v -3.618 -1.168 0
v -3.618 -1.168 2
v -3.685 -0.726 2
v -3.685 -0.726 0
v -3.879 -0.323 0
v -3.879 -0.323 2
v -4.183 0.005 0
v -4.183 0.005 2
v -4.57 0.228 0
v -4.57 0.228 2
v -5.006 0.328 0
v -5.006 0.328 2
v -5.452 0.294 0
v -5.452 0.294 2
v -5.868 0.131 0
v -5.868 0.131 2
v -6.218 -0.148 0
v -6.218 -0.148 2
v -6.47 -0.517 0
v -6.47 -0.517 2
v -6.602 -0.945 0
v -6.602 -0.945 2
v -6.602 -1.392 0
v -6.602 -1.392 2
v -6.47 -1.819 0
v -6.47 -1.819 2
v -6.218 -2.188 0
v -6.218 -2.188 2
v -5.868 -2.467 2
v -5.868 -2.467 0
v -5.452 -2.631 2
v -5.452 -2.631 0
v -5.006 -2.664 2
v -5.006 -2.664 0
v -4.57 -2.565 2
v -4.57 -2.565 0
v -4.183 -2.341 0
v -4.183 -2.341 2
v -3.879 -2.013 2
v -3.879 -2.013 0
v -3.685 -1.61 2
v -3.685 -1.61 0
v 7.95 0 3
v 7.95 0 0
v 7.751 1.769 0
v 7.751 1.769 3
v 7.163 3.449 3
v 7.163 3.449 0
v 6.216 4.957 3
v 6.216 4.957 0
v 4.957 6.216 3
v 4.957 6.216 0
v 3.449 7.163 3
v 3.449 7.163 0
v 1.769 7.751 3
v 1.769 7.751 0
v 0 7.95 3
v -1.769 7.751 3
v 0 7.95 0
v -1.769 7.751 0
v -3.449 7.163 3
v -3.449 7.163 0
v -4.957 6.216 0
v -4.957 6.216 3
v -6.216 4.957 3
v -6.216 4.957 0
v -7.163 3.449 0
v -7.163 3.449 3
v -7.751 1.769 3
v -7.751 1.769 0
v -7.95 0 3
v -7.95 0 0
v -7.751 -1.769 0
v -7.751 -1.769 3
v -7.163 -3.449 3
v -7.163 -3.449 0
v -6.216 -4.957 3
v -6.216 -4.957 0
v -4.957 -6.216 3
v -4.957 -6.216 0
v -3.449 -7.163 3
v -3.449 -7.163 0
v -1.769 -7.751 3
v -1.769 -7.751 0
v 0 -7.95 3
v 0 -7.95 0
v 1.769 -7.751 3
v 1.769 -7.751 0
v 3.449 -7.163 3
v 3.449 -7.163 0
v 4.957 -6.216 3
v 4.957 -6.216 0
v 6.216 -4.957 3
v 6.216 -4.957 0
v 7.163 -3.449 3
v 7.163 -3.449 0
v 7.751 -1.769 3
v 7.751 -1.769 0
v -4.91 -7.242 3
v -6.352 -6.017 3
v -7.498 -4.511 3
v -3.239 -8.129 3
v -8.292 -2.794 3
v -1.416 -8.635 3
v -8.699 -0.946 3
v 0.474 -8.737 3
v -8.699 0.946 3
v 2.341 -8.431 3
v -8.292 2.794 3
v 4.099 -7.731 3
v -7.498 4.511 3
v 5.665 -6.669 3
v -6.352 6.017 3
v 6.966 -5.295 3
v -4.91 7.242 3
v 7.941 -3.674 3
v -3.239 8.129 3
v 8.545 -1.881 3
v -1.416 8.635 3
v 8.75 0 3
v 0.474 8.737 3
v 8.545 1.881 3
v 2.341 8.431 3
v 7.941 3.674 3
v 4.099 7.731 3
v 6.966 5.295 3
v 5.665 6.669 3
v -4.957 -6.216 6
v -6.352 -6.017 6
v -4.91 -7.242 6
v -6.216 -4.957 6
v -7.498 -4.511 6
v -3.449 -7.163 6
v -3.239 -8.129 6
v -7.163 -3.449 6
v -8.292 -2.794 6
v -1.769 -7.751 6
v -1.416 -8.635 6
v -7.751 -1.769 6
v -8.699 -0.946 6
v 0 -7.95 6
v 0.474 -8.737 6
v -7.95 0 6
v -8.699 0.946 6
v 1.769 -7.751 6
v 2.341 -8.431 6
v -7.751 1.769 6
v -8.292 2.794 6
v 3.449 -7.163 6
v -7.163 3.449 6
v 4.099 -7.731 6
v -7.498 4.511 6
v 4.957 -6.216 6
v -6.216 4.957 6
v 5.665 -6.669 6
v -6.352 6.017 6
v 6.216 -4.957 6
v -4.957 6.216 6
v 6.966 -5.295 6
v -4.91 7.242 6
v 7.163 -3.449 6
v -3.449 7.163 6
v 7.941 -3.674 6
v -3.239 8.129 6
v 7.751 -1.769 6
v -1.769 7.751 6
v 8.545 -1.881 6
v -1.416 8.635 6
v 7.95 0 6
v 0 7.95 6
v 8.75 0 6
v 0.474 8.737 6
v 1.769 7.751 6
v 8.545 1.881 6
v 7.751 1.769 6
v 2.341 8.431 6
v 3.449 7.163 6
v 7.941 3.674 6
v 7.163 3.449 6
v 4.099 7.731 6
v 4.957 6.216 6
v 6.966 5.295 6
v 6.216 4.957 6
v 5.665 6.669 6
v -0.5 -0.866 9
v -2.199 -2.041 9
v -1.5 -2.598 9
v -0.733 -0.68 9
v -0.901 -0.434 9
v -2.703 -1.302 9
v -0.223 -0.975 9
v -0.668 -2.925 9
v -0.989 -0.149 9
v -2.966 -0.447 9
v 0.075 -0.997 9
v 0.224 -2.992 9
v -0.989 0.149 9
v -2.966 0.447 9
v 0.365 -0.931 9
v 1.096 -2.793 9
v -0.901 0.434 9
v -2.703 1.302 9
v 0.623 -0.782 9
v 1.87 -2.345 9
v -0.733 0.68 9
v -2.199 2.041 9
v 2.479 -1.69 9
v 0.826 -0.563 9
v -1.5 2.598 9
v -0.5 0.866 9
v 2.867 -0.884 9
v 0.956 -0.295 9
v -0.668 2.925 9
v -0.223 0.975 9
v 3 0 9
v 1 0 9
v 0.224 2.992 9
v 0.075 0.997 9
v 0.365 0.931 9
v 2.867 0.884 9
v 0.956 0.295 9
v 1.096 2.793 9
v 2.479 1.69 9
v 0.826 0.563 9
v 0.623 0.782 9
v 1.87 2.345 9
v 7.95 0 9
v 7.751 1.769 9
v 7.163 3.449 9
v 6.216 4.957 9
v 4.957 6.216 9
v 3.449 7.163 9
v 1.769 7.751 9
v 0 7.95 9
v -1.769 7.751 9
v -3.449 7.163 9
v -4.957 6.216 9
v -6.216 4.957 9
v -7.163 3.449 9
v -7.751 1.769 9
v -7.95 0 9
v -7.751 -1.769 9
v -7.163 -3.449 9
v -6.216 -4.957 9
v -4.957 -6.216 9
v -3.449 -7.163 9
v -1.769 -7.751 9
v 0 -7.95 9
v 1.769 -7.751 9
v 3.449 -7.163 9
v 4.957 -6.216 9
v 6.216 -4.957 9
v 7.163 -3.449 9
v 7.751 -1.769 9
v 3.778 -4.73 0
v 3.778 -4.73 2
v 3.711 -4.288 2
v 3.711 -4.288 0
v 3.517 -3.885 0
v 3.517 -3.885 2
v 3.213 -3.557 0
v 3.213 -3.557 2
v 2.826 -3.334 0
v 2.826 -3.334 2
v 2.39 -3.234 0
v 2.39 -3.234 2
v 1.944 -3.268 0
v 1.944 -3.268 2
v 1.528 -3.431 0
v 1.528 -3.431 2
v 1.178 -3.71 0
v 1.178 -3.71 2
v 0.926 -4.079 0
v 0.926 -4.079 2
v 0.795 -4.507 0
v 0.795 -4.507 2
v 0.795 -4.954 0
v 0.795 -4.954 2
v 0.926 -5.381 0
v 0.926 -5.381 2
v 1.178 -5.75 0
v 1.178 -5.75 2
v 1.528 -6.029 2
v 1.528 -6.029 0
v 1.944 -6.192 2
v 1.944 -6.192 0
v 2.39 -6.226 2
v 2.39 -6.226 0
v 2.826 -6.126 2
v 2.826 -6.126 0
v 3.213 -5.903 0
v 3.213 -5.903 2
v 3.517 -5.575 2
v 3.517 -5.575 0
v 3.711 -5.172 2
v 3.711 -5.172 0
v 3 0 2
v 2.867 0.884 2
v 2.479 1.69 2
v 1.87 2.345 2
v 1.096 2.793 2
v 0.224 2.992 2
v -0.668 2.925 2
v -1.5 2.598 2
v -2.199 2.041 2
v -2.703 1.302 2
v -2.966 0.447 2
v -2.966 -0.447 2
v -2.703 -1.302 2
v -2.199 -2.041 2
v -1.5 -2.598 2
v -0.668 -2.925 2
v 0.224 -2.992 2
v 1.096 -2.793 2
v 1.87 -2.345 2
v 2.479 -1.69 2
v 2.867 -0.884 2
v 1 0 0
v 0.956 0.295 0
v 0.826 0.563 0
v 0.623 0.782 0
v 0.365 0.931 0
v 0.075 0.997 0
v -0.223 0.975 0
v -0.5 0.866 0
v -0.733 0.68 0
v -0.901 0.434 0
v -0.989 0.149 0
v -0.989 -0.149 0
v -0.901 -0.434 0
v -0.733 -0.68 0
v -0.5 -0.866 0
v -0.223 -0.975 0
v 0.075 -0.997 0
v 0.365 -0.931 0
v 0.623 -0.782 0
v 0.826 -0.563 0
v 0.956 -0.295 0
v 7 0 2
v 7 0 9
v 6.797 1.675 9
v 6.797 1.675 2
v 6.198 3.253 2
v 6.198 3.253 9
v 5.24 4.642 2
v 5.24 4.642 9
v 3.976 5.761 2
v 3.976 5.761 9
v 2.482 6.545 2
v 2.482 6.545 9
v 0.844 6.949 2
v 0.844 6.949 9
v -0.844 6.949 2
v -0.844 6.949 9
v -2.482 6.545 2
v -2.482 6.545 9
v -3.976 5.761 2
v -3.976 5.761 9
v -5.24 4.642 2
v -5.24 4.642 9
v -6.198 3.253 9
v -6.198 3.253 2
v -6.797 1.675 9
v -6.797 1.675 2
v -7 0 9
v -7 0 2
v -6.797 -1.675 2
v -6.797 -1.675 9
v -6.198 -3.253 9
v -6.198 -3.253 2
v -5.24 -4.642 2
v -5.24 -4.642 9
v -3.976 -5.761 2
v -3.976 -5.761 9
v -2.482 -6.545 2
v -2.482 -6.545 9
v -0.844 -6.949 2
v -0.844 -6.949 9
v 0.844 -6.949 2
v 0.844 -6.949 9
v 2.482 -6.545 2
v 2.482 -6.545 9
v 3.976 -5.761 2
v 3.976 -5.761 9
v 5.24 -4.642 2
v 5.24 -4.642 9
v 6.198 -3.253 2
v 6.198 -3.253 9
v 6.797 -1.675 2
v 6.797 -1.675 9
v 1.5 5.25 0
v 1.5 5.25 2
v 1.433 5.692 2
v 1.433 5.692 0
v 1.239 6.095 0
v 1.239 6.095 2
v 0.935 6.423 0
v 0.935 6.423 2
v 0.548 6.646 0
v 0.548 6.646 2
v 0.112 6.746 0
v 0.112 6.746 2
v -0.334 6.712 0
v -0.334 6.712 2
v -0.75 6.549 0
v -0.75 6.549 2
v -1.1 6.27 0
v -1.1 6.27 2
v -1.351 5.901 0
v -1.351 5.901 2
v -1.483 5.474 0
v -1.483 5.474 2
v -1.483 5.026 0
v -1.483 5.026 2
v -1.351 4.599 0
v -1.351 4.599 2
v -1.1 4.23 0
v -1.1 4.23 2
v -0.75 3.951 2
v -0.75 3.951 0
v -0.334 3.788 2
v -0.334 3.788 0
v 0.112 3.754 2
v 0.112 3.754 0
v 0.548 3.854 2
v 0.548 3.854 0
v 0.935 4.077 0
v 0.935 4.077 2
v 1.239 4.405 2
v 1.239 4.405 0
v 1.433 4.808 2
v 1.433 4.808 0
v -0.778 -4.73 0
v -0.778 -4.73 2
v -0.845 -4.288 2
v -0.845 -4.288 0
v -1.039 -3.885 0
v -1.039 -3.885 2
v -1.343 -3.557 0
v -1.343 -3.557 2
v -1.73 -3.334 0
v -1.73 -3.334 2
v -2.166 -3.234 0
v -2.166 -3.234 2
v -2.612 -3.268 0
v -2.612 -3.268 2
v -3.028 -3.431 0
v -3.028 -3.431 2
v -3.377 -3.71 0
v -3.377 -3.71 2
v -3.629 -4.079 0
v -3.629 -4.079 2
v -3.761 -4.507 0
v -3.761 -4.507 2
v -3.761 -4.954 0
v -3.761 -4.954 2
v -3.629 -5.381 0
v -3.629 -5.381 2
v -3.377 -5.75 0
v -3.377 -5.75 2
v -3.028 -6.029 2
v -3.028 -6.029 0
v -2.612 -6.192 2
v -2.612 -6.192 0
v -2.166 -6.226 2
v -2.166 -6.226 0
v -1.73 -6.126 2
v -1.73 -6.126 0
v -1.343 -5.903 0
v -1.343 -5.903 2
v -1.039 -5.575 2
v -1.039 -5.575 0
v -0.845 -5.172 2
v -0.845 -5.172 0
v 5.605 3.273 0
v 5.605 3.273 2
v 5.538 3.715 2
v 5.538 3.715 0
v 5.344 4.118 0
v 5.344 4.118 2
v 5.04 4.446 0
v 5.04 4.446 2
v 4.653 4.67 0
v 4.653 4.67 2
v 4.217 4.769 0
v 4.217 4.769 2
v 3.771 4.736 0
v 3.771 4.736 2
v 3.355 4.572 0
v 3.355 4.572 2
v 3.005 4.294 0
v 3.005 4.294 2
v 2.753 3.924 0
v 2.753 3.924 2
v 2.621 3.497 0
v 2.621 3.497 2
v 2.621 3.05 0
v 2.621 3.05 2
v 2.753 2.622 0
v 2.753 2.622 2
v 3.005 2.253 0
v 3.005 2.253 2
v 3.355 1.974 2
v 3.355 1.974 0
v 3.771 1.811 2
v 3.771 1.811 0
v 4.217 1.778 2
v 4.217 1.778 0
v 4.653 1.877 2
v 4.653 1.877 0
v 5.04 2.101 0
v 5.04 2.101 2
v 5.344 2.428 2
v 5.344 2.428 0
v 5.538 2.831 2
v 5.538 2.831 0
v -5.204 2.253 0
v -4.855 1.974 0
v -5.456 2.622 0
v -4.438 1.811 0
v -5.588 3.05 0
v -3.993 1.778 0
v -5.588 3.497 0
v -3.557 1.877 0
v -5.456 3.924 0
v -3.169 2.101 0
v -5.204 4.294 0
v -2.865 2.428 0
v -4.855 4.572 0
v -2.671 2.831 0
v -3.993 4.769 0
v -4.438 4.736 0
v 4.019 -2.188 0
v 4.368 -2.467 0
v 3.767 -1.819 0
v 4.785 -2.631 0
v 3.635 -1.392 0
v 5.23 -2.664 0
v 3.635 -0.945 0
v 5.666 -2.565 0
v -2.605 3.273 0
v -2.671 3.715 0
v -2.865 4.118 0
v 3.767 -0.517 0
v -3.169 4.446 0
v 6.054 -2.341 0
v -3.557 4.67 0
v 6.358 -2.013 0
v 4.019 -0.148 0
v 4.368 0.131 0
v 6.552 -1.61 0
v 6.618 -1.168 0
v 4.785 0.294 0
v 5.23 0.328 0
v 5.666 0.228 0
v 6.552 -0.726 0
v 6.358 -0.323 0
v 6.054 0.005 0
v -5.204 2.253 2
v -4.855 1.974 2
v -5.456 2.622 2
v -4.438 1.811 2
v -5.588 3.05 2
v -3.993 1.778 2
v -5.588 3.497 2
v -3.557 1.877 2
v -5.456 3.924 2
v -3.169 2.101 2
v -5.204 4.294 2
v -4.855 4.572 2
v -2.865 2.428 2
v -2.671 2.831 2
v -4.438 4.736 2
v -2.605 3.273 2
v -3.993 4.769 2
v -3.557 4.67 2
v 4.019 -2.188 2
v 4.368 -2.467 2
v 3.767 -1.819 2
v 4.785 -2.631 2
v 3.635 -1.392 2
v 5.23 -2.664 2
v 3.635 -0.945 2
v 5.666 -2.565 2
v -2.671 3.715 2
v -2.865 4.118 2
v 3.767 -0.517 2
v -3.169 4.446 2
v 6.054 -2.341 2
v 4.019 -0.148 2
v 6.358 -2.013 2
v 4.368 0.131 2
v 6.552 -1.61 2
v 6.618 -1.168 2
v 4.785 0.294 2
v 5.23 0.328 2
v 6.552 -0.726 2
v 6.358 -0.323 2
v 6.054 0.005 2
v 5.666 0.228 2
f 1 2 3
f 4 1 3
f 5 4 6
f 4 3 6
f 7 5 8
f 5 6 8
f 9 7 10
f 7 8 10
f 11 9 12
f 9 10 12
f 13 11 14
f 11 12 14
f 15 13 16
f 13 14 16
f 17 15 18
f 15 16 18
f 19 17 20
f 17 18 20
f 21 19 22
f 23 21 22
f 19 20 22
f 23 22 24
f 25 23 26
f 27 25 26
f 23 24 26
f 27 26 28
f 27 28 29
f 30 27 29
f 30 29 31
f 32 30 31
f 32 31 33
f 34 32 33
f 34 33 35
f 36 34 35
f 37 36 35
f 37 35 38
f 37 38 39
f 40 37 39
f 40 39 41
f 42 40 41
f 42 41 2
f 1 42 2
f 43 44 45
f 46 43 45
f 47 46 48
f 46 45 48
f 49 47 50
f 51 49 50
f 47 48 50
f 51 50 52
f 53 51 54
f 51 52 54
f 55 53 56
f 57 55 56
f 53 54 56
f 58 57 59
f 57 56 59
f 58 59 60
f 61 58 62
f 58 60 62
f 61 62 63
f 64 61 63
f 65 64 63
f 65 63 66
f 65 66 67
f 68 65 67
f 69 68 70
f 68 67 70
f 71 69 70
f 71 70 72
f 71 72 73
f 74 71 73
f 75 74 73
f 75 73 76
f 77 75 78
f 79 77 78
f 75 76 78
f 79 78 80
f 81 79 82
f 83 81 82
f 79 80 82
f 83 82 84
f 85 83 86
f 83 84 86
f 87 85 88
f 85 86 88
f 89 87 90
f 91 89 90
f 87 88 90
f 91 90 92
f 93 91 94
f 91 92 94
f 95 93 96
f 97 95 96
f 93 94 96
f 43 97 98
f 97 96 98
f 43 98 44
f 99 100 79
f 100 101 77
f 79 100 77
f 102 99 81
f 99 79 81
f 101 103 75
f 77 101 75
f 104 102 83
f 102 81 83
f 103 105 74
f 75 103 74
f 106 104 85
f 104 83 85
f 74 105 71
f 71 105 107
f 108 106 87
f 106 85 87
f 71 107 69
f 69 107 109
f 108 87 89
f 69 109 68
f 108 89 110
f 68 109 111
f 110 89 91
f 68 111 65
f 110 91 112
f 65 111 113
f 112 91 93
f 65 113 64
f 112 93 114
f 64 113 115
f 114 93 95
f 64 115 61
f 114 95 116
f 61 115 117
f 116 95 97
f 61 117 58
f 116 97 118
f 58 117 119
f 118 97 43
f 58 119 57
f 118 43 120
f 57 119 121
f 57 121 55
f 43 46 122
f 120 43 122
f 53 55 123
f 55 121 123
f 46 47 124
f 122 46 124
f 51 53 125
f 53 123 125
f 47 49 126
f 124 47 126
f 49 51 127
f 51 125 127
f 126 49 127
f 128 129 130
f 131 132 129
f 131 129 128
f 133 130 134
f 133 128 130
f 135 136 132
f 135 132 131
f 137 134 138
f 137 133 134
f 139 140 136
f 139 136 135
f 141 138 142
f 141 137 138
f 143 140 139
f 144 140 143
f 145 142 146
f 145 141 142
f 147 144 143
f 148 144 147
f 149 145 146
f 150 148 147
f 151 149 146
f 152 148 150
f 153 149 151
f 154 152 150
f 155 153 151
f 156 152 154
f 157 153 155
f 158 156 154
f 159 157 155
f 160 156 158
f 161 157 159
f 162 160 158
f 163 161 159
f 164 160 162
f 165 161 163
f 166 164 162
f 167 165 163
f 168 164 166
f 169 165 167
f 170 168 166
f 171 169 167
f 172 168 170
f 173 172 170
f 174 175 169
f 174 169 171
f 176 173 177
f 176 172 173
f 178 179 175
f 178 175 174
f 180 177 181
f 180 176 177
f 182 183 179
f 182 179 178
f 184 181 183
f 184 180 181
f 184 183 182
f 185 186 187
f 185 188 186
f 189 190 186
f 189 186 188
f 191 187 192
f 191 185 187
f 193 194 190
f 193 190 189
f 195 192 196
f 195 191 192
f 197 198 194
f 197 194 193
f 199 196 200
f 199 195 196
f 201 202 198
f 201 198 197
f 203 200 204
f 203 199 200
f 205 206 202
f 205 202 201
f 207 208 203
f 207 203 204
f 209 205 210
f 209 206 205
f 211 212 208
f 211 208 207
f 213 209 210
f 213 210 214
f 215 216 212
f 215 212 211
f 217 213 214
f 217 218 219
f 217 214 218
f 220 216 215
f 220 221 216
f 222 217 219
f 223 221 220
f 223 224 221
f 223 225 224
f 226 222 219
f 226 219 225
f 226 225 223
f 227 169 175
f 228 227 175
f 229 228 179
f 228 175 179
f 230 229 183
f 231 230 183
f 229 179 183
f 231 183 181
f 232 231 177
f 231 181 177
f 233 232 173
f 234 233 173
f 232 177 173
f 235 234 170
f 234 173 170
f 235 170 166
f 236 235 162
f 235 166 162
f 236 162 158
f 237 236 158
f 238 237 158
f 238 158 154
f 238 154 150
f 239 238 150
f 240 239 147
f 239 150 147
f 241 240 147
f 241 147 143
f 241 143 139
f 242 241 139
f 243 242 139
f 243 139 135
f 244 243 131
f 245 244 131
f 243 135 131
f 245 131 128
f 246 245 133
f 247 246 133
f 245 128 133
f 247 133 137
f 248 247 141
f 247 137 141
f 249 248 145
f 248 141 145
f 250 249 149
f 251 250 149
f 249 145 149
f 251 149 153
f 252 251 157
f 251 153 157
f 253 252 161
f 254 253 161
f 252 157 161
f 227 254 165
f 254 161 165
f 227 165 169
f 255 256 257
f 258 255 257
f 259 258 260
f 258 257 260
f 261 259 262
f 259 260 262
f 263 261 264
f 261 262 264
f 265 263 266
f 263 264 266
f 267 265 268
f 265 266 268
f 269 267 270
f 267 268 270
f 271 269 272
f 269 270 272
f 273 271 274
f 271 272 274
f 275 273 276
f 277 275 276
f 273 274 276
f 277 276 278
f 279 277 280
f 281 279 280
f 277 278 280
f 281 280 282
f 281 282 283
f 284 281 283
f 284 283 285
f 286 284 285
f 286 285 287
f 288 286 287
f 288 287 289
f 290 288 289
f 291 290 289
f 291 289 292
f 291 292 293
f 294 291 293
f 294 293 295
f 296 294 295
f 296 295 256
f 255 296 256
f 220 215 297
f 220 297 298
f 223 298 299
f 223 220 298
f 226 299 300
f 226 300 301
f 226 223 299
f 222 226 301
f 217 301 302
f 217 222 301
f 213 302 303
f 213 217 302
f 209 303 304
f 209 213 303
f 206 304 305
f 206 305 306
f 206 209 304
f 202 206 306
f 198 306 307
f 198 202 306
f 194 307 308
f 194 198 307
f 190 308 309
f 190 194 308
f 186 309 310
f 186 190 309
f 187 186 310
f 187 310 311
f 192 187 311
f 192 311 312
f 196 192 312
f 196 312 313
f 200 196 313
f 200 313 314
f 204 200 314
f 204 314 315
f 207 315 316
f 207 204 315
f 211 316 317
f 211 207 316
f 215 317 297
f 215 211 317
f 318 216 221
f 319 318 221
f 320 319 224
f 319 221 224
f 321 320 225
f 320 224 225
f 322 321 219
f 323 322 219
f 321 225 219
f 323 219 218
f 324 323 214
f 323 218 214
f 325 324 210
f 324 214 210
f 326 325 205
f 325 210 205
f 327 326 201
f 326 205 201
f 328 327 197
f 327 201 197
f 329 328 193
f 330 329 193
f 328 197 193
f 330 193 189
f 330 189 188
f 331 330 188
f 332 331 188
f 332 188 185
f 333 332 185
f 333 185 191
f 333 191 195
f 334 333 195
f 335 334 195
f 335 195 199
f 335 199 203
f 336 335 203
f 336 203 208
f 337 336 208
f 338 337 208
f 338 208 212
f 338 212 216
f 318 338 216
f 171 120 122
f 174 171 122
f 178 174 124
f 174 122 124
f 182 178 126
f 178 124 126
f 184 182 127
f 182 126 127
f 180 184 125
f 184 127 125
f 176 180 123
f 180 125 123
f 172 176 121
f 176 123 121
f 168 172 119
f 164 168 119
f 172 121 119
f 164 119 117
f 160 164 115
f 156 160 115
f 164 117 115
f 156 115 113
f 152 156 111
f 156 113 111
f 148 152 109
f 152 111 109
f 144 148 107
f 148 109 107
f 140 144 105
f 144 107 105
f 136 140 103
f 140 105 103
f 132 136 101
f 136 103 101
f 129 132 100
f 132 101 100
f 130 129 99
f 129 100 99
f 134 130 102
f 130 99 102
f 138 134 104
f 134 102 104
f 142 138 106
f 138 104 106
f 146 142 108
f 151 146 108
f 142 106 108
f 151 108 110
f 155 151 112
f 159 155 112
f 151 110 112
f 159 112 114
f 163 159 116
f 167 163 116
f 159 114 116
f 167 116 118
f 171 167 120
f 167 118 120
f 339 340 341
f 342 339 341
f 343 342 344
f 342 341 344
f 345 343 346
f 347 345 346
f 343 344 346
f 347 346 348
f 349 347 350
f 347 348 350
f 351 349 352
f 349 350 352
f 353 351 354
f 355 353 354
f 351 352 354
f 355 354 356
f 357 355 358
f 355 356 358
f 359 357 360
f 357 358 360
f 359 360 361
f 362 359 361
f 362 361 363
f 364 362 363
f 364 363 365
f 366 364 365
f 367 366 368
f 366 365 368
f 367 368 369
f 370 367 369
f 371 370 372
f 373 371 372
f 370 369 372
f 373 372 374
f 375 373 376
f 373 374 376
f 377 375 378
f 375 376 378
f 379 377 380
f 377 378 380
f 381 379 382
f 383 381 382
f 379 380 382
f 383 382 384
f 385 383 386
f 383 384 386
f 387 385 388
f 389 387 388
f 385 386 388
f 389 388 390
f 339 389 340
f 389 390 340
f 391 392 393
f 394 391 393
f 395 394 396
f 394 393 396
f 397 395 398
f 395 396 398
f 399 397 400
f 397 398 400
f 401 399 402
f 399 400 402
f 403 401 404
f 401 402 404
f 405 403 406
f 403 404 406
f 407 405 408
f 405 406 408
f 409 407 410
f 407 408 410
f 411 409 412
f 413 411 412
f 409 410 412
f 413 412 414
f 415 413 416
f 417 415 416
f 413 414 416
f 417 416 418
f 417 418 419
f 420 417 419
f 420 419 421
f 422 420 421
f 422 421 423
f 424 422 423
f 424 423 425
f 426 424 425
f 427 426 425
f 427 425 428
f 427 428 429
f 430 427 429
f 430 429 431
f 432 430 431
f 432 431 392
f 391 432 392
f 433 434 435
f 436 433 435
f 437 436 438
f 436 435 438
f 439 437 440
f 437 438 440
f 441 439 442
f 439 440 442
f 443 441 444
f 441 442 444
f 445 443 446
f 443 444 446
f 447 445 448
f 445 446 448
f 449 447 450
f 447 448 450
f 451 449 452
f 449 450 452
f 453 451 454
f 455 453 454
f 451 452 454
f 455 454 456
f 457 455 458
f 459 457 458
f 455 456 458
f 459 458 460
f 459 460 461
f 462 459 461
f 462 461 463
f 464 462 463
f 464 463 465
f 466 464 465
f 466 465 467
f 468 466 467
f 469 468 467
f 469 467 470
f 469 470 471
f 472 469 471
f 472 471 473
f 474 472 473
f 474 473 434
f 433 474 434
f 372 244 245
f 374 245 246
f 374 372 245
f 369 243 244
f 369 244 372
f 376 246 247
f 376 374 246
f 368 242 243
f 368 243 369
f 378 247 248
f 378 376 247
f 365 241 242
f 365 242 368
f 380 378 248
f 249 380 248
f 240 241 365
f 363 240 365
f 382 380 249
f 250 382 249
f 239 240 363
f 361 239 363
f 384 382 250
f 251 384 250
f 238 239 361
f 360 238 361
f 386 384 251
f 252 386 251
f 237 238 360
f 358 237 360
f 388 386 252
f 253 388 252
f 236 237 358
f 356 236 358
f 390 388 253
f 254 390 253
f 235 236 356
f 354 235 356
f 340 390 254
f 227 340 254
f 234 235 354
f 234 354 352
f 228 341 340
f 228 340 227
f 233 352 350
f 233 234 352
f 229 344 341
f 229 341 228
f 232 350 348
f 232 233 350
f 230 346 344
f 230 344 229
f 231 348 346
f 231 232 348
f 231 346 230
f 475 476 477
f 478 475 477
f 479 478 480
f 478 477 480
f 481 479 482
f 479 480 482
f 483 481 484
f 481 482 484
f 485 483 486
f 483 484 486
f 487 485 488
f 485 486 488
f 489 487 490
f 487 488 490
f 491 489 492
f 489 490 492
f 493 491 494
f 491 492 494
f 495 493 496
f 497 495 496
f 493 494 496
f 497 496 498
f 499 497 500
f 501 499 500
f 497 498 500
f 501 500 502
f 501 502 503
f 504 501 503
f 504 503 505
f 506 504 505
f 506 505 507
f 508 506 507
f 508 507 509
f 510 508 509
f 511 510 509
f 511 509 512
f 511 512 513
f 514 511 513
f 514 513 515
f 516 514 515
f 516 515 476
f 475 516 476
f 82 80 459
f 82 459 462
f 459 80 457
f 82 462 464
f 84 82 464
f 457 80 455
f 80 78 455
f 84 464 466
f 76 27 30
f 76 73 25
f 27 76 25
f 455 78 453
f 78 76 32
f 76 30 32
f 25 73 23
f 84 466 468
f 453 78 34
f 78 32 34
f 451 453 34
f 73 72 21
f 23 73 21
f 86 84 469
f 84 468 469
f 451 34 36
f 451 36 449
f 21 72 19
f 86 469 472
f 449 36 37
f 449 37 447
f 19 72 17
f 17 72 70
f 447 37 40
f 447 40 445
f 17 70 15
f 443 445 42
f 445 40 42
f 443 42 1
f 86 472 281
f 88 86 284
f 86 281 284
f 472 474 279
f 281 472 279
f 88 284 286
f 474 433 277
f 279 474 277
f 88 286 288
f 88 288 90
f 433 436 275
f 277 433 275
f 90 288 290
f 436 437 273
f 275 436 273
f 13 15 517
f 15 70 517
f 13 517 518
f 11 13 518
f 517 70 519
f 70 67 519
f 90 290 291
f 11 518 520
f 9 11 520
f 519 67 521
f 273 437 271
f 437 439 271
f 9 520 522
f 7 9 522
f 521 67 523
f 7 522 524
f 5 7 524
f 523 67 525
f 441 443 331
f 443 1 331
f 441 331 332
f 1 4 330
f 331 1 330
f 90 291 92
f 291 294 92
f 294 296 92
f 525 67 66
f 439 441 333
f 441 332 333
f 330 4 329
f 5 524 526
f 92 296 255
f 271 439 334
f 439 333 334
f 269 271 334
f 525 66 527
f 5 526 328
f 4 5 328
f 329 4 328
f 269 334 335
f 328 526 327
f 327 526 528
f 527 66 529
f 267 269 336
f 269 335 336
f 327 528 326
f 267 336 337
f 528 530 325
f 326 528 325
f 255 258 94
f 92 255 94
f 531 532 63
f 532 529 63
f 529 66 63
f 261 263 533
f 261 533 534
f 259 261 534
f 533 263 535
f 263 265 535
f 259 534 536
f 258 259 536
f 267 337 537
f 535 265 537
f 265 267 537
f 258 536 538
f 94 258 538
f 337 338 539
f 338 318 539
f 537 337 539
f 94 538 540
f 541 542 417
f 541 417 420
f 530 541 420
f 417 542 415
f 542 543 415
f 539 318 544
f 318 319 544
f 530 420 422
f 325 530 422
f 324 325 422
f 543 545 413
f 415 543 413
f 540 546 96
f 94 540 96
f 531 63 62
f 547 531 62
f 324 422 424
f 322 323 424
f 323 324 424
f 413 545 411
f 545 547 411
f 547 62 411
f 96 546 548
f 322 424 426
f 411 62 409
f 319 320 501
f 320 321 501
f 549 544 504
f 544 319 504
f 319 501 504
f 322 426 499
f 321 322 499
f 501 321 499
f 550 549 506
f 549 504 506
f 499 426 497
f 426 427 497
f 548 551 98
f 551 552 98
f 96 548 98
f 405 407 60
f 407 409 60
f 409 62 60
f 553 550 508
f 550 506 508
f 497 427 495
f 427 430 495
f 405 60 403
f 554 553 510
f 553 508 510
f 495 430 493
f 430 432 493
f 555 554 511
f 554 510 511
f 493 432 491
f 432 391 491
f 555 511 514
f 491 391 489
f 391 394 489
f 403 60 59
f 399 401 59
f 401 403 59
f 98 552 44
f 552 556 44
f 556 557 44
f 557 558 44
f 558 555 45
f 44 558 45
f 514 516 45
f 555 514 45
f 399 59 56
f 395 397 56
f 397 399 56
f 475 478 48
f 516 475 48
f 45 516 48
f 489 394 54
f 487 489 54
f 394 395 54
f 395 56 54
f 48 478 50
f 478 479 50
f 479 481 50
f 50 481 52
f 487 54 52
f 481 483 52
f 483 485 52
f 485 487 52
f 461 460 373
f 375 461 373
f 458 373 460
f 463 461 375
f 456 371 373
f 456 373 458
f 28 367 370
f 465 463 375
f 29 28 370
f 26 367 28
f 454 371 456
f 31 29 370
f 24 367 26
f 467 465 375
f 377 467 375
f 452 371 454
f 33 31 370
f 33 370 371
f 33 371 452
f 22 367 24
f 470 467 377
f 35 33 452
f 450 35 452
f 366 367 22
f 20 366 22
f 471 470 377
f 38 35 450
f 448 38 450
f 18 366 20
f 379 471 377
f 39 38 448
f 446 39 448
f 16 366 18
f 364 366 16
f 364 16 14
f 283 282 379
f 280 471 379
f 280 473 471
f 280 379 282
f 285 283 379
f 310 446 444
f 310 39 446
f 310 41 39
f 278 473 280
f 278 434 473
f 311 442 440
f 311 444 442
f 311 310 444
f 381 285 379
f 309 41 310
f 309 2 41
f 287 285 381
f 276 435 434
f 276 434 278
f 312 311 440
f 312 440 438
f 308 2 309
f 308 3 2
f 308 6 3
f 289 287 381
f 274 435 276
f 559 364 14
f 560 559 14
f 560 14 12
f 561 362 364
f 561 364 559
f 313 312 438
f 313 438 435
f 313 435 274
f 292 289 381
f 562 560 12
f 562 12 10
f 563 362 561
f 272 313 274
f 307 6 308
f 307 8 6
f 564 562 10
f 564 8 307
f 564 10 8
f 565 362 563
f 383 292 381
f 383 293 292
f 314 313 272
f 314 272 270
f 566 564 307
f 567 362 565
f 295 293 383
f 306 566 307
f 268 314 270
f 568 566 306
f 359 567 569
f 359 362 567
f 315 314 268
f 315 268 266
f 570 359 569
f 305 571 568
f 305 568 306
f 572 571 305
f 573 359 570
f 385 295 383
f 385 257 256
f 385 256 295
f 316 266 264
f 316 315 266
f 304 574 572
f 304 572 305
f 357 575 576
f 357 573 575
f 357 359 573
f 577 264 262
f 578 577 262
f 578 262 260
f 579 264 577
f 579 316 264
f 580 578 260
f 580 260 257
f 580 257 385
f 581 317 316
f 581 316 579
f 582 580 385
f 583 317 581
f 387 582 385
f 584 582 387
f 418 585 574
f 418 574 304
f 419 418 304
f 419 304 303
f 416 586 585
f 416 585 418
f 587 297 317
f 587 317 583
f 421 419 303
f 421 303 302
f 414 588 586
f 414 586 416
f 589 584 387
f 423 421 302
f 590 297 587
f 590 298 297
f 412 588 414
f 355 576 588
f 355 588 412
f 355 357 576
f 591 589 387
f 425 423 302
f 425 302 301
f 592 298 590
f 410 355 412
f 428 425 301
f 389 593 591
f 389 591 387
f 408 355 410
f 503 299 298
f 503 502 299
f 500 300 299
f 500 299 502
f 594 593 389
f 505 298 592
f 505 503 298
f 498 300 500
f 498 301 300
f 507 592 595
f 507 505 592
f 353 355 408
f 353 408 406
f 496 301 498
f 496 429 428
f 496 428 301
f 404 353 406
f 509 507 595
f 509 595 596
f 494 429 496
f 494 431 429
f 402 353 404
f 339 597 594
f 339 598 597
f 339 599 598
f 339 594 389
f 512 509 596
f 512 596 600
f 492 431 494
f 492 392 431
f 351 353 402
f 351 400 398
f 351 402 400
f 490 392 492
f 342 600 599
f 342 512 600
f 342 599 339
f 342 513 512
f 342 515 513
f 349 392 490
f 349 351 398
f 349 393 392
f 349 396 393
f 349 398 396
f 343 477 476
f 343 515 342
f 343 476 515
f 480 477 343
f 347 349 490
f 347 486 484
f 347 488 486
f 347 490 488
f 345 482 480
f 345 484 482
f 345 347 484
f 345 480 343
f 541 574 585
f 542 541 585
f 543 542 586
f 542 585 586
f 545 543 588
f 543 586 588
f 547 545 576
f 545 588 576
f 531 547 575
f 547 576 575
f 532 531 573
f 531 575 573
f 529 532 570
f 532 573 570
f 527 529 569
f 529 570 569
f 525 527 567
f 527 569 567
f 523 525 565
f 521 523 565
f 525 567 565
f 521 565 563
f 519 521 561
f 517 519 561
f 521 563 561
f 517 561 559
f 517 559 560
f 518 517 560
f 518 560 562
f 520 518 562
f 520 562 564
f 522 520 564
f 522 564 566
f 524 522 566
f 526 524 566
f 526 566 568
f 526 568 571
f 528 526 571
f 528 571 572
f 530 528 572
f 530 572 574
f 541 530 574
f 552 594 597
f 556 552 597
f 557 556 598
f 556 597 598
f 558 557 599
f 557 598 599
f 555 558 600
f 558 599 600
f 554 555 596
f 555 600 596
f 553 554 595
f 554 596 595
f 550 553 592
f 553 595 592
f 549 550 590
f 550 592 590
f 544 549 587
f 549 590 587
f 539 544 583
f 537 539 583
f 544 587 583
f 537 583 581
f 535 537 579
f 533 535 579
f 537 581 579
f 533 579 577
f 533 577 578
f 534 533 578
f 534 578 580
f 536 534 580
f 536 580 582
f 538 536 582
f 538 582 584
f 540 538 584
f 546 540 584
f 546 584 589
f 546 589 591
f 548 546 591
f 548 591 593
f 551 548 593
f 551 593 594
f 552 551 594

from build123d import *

# Parameters (mm, degrees)
F0_R      = 7.95
F1_DEPTH  = 3
F2_R      = 8.75
F2_R_2    = 7.95
F3_DEPTH  = 3
F4_R      = 7.95
F5_DEPTH  = 3
F6_R      = 1.5
F7_DEPTH  = 25
F8_R      = 7
F8_R_2    = 1.5
F8_R_3    = 3
F9_DEPTH  = 7
F10_R     = 1
F11_DEPTH = 25


with BuildPart() as f1:
    # F0 (on Top) → F1 (new body)
    with BuildSketch(Plane.XY):
        Circle(F0_R)
    extrude(amount=F1_DEPTH)

    # F2 (on face) → F3 (join)
    with BuildSketch(Plane.XY.offset(3)):
        Circle(F2_R)
        Circle(F2_R_2, mode=Mode.SUBTRACT)
        Circle(F2_R_2)
    extrude(amount=F3_DEPTH)

    # F4 (on face) → F5 (join)
    with BuildSketch(Plane.XY.offset(6)):
        Circle(F4_R)
    extrude(amount=F5_DEPTH)

    # F6 (on face) → F7 (cut)
    with BuildSketch(Plane.XY.offset(9)):
        with Locations((-4.104615283, 3.2733214598)):
            Circle(F6_R)
        with Locations((0, 5.25)):
            Circle(F6_R)
        with Locations((4.104615283, 3.2733214598)):
            Circle(F6_R)
        with Locations((5.118371539, -1.1682349033)):
            Circle(F6_R)
        with Locations((2.2778896304, -4.7300865565)):
            Circle(F6_R)
        with Locations((-2.2778896304, -4.7300865565)):
            Circle(F6_R)
        with Locations((-5.118371539, -1.1682349033)):
            Circle(F6_R)
    extrude(amount=-F7_DEPTH, mode=Mode.SUBTRACT)

    # F8 (on face) → F9 (cut)
    with BuildSketch(Plane.XY.offset(9)):
        Circle(F8_R)
        with Locations((-2.2778896304, -4.7300865565)):
            Circle(F8_R_2, mode=Mode.SUBTRACT)
        with Locations((-5.118371539, -1.1682349033)):
            Circle(F8_R_2, mode=Mode.SUBTRACT)
        with Locations((2.2778896304, -4.7300865565)):
            Circle(F8_R_2, mode=Mode.SUBTRACT)
        with Locations((5.118371539, -1.1682349033)):
            Circle(F8_R_2, mode=Mode.SUBTRACT)
        with Locations((-4.104615283, 3.2733214598)):
            Circle(F8_R_2, mode=Mode.SUBTRACT)
        Circle(F8_R_3, mode=Mode.SUBTRACT)
        with Locations((4.104615283, 3.2733214598)):
            Circle(F8_R_2, mode=Mode.SUBTRACT)
        with Locations((0, 5.25)):
            Circle(F8_R_2, mode=Mode.SUBTRACT)
    extrude(amount=-F9_DEPTH, mode=Mode.SUBTRACT)

    # F10 (on face) → F11 (cut)
    with BuildSketch(Plane.XY.offset(9)):
        Circle(F10_R)
    extrude(amount=-F11_DEPTH, mode=Mode.SUBTRACT)


solid = f1.part
